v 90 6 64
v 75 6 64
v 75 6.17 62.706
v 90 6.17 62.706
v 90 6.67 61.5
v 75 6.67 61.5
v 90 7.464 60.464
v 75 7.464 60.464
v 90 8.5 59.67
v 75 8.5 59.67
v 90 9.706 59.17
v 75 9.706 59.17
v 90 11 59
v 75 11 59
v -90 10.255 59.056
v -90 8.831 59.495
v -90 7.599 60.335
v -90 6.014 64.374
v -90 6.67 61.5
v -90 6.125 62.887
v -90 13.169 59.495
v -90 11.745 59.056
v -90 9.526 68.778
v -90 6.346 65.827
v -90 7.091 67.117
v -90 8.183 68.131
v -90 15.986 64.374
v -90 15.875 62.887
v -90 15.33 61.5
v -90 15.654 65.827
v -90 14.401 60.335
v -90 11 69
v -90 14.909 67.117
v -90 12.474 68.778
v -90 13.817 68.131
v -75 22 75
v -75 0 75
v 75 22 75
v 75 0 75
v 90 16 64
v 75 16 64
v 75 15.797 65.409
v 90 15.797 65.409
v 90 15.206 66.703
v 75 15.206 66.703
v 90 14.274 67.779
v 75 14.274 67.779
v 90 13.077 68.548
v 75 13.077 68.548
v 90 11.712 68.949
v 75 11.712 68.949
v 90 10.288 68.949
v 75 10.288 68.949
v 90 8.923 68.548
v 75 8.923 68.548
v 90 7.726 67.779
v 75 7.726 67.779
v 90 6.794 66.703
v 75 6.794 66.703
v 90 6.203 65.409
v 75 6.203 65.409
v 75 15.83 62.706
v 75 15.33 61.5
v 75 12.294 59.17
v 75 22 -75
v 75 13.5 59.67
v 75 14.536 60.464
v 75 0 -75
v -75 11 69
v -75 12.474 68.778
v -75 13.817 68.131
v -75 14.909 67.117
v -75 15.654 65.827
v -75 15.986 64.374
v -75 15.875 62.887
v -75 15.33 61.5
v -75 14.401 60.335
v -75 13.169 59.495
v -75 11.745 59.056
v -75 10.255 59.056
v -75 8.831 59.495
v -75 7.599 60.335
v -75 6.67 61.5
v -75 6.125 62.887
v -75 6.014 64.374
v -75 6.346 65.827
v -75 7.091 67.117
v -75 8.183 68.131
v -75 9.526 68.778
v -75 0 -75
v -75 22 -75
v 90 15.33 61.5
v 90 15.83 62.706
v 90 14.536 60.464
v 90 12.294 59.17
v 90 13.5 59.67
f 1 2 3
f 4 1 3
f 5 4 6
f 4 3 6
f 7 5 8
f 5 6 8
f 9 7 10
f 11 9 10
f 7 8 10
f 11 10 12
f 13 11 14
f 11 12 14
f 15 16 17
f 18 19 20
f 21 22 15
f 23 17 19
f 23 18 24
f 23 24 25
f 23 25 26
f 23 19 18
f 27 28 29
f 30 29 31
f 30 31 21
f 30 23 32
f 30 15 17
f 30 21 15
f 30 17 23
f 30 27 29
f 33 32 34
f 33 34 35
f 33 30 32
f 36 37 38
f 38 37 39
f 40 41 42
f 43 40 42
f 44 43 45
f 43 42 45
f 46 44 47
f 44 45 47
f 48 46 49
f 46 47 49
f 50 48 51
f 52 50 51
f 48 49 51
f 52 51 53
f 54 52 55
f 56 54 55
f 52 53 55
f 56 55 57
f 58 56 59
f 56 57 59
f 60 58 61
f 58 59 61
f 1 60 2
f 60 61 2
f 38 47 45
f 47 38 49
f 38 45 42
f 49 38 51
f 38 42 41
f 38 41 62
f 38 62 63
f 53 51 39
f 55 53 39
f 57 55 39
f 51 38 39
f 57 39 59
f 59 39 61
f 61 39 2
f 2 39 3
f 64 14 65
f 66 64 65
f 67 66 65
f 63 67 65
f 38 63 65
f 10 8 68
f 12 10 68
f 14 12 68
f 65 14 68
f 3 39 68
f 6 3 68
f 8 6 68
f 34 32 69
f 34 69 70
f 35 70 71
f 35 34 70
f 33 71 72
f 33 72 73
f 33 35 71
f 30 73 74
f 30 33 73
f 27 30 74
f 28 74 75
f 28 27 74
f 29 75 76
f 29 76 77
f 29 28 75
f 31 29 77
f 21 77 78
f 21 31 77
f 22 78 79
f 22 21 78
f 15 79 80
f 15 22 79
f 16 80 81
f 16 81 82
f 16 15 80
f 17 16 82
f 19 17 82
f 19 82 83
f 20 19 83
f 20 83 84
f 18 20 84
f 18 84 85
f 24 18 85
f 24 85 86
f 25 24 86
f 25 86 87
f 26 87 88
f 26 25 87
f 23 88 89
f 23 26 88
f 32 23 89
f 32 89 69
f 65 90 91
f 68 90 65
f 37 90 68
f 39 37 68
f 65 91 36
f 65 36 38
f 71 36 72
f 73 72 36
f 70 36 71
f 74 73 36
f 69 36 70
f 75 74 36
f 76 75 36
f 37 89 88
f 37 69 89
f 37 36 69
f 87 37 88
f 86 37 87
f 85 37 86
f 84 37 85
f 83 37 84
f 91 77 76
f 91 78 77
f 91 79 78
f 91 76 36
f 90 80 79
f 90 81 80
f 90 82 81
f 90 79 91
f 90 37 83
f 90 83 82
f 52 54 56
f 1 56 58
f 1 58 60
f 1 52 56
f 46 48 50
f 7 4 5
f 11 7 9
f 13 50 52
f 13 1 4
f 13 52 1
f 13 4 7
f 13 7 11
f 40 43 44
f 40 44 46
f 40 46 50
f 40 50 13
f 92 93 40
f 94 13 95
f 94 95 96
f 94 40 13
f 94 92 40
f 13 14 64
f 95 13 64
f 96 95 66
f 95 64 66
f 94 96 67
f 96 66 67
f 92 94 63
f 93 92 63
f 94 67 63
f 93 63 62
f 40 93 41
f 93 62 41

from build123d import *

# Parameters (mm, degrees)
ESQUISSE1_W        = 150
ESQUISSE1_H        = 150
BOSS_EXTRU_1_DEPTH = 22
BOSS_EXTRU_2_DEPTH = 15
BOSS_EXTRU_3_START = 15
ESQUISSE6_R        = 5
BOSS_EXTRU_3_DEPTH = 15


with BuildPart() as part:
    # Esquisse1 → Boss.-Extru.1 (new body)
    with BuildSketch(Plane(origin=(0, 0, 0), x_dir=(1, 0, 0), z_dir=(0, 1, 0))):
        Rectangle(ESQUISSE1_W, ESQUISSE1_H)
    extrude(amount=BOSS_EXTRU_1_DEPTH)

    # Esquisse2 → Boss.-Extru.2 (add)
    with BuildSketch(Plane(origin=(75, 0, 0), x_dir=(0, 0, -1), z_dir=(1, 0, 0))):
        with BuildLine():
            ThreePointArc((-64, 16), (-69, 11), (-64, 6))
            Line((-64, 6), (-64, 16))
        make_face()
        with BuildLine():
            Line((-64, 16), (-64, 6))
            ThreePointArc((-64, 6), (-60.464466094, 7.464466094), (-59, 11))
            ThreePointArc((-59, 11), (-60.464466094, 14.535533906), (-64, 16))
        make_face()
    extrude(amount=BOSS_EXTRU_2_DEPTH)

    # Esquisse6 → Boss.-Extru.3 (add)
    with BuildSketch(Plane.ZY.offset(75).offset(BOSS_EXTRU_3_START)):
        with Locations((64, 11)):
            Circle(ESQUISSE6_R)
    extrude(amount=-BOSS_EXTRU_3_DEPTH)


solid = part.part
